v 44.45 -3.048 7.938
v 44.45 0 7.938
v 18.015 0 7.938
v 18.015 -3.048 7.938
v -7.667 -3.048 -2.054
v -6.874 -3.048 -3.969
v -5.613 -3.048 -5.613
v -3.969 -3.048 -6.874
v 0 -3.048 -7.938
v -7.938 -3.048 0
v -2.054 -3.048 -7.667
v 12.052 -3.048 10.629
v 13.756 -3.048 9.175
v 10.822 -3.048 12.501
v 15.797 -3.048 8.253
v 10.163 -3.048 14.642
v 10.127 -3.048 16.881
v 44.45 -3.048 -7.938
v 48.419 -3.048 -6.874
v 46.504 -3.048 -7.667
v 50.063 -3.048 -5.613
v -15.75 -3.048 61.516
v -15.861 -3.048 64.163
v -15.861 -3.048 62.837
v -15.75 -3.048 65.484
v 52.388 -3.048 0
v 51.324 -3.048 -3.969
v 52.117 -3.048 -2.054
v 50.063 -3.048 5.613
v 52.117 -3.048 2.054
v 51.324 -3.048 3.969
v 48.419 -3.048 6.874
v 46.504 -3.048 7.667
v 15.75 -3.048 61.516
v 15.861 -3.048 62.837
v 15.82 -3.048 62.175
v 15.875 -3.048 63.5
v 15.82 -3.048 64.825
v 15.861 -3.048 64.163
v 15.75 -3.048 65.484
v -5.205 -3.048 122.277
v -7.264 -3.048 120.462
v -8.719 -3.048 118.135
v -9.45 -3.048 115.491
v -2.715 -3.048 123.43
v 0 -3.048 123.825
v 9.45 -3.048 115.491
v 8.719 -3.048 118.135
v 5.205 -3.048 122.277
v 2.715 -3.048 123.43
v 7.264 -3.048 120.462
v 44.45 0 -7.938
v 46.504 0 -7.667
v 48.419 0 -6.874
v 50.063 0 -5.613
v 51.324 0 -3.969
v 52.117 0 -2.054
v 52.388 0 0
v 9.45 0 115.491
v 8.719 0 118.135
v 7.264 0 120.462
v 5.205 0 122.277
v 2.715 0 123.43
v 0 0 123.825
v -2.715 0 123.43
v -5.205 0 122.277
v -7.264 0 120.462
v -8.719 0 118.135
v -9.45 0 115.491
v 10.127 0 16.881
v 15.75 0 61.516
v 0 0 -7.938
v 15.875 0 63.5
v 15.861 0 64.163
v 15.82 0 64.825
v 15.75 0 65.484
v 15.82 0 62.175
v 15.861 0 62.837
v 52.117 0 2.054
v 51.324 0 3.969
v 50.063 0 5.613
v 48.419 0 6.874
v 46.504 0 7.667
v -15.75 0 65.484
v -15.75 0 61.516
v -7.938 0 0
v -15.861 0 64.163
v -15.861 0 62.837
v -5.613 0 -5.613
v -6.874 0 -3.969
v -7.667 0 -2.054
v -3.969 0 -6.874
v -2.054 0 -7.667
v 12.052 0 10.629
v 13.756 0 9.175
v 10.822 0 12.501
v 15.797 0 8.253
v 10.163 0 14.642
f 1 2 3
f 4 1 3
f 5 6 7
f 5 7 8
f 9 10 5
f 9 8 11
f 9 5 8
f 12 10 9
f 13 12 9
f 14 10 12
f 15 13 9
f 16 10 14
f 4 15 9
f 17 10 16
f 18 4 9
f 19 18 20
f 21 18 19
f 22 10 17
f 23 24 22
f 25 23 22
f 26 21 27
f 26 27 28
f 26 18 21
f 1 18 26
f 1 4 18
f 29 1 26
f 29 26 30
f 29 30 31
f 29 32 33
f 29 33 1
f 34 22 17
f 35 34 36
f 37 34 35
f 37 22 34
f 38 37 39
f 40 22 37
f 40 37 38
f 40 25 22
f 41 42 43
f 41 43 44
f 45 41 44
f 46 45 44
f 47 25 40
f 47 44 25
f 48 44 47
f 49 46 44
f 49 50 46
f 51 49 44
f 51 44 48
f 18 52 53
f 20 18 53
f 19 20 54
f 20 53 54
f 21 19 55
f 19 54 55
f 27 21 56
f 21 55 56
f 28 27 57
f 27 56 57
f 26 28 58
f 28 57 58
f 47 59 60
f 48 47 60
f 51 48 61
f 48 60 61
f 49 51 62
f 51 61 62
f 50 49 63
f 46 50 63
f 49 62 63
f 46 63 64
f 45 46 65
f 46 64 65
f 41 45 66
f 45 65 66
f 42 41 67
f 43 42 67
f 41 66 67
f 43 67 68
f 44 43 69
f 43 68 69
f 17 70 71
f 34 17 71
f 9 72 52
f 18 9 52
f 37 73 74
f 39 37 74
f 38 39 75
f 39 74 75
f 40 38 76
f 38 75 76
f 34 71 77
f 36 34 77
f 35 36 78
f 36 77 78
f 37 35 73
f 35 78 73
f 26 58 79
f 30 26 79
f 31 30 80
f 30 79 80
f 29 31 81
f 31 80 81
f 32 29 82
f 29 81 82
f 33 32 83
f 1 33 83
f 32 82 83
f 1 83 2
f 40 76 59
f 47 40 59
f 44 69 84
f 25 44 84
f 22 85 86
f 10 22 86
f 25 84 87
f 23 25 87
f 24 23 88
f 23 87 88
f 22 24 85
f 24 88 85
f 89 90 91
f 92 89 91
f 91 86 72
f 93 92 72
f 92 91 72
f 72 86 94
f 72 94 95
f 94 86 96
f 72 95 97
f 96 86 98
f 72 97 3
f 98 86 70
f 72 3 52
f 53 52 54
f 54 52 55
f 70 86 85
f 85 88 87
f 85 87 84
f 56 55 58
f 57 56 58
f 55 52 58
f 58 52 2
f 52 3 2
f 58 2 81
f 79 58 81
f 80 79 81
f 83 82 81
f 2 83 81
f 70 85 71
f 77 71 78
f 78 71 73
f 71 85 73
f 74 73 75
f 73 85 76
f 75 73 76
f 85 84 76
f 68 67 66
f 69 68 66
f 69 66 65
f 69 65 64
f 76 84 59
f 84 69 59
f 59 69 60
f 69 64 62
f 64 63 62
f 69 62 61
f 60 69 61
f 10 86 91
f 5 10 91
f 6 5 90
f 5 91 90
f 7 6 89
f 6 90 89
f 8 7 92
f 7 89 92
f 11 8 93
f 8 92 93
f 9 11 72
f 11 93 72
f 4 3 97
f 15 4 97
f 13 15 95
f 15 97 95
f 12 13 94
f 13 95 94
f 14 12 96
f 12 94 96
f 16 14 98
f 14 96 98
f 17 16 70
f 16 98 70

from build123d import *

# Parameters (mm, degrees)
F0_R     = 3.175
F1_DEPTH = 3.048


# Not quite as in the source:
# - ends of sketch curves that miss each other by under 0.0002 mm in the source are joined


with BuildPart() as f1:
    # F0 (on Front) → F1 (new body)
    with BuildSketch(Plane.XZ):
        with BuildLine():
            ThreePointArc((-7.9375, 0), (0, 7.9375), (7.9375, 0))
            ThreePointArc((7.9375, 0), (5.6126600757, -5.6126600757), (0, -7.9375))
            Line((0, -7.9375), (44.45, -7.9375))
            ThreePointArc((44.45, -7.9375), (36.5125, 0), (44.45, 7.9375))
            Line((44.45, 7.9375), (18.0149584735, 7.9375))
            ThreePointArc((18.0149584735, 7.9375), (12.0523084735, 10.6291369817), (10.127113946, 16.881475))
            Line((10.127113946, 16.881475), (15.7504882737, 61.515625))
            ThreePointArc((15.7504882737, 61.515625), (15.8438414904, 62.5058612634), (15.875, 63.5))
            ThreePointArc((15.875, 63.5), (15.8438414904, 64.4941387366), (15.7504882737, 65.484375))
            ThreePointArc((15.7504882737, 65.484375), (0, 79.375), (-15.7504882737, 65.484375))
            ThreePointArc((-15.7504882737, 65.484375), (-15.875, 63.4999684915), (-15.7504803964, 61.5155624772))
            Line((-15.7504803964, 61.5155624772), (-7.9375, 0))
        make_face()
        with Locations((0, 63.5)):
            Circle(F0_R, mode=Mode.SUBTRACT)
        with BuildLine():
            Line((-9.4502929642, 115.490625), (-15.7504882737, 65.484375))
            ThreePointArc((-15.7504882737, 65.484375), (0, 79.375), (15.7504882737, 65.484375))
            Line((15.7504882737, 65.484375), (9.4502929642, 115.490625))
            ThreePointArc((9.4502929642, 115.490625), (9.5063048942, 114.896483242), (9.525, 114.3))
            ThreePointArc((9.525, 114.3), (-0.596483242, 104.7936951058), (-9.4502929642, 115.490625))
        make_face()
        with Locations((-3.175, 100.0252)):
            Circle(F0_R, mode=Mode.SUBTRACT)
        with BuildLine():
            ThreePointArc((9.4502929642, 115.490625), (0, 123.825), (-9.4502929642, 115.490625))
            ThreePointArc((-9.4502929642, 115.490625), (-0.596483242, 104.7936951058), (9.525, 114.3))
            ThreePointArc((9.525, 114.3), (9.5063048942, 114.896483242), (9.4502929642, 115.490625))
        make_face()
        with Locations((0, 114.3)):
            Circle(F0_R, mode=Mode.SUBTRACT)
        with BuildLine():
            ThreePointArc((0, -7.9375), (5.6126600757, -5.6126600757), (7.9375, 0))
            ThreePointArc((7.9375, 0), (0, 7.9375), (-7.9375, 0))
            ThreePointArc((-7.9375, 0), (-5.6126600757, -5.6126600757), (0, -7.9375))
        make_face()
        Circle(F0_R, mode=Mode.SUBTRACT)
        with BuildLine():
            ThreePointArc((44.45, 7.9375), (36.5125, 0), (44.45, -7.9375))
            ThreePointArc((44.45, -7.9375), (50.0626600757, -5.6126600757), (52.3875, 0))
            ThreePointArc((52.3875, 0), (50.0626600757, 5.6126600757), (44.45, 7.9375))
        make_face()
        with Locations((44.45, 0)):
            Circle(F0_R, mode=Mode.SUBTRACT)
        with Locations((44.45, 0)):
            Circle(F0_R)
        with Locations((0, 63.5)):
            Circle(F0_R)
        with Locations((-3.175, 100.0252)):
            Circle(F0_R)
        with Locations((0, 114.3)):
            Circle(F0_R)
        Circle(F0_R)
    extrude(amount=F1_DEPTH)


solid = f1.part
